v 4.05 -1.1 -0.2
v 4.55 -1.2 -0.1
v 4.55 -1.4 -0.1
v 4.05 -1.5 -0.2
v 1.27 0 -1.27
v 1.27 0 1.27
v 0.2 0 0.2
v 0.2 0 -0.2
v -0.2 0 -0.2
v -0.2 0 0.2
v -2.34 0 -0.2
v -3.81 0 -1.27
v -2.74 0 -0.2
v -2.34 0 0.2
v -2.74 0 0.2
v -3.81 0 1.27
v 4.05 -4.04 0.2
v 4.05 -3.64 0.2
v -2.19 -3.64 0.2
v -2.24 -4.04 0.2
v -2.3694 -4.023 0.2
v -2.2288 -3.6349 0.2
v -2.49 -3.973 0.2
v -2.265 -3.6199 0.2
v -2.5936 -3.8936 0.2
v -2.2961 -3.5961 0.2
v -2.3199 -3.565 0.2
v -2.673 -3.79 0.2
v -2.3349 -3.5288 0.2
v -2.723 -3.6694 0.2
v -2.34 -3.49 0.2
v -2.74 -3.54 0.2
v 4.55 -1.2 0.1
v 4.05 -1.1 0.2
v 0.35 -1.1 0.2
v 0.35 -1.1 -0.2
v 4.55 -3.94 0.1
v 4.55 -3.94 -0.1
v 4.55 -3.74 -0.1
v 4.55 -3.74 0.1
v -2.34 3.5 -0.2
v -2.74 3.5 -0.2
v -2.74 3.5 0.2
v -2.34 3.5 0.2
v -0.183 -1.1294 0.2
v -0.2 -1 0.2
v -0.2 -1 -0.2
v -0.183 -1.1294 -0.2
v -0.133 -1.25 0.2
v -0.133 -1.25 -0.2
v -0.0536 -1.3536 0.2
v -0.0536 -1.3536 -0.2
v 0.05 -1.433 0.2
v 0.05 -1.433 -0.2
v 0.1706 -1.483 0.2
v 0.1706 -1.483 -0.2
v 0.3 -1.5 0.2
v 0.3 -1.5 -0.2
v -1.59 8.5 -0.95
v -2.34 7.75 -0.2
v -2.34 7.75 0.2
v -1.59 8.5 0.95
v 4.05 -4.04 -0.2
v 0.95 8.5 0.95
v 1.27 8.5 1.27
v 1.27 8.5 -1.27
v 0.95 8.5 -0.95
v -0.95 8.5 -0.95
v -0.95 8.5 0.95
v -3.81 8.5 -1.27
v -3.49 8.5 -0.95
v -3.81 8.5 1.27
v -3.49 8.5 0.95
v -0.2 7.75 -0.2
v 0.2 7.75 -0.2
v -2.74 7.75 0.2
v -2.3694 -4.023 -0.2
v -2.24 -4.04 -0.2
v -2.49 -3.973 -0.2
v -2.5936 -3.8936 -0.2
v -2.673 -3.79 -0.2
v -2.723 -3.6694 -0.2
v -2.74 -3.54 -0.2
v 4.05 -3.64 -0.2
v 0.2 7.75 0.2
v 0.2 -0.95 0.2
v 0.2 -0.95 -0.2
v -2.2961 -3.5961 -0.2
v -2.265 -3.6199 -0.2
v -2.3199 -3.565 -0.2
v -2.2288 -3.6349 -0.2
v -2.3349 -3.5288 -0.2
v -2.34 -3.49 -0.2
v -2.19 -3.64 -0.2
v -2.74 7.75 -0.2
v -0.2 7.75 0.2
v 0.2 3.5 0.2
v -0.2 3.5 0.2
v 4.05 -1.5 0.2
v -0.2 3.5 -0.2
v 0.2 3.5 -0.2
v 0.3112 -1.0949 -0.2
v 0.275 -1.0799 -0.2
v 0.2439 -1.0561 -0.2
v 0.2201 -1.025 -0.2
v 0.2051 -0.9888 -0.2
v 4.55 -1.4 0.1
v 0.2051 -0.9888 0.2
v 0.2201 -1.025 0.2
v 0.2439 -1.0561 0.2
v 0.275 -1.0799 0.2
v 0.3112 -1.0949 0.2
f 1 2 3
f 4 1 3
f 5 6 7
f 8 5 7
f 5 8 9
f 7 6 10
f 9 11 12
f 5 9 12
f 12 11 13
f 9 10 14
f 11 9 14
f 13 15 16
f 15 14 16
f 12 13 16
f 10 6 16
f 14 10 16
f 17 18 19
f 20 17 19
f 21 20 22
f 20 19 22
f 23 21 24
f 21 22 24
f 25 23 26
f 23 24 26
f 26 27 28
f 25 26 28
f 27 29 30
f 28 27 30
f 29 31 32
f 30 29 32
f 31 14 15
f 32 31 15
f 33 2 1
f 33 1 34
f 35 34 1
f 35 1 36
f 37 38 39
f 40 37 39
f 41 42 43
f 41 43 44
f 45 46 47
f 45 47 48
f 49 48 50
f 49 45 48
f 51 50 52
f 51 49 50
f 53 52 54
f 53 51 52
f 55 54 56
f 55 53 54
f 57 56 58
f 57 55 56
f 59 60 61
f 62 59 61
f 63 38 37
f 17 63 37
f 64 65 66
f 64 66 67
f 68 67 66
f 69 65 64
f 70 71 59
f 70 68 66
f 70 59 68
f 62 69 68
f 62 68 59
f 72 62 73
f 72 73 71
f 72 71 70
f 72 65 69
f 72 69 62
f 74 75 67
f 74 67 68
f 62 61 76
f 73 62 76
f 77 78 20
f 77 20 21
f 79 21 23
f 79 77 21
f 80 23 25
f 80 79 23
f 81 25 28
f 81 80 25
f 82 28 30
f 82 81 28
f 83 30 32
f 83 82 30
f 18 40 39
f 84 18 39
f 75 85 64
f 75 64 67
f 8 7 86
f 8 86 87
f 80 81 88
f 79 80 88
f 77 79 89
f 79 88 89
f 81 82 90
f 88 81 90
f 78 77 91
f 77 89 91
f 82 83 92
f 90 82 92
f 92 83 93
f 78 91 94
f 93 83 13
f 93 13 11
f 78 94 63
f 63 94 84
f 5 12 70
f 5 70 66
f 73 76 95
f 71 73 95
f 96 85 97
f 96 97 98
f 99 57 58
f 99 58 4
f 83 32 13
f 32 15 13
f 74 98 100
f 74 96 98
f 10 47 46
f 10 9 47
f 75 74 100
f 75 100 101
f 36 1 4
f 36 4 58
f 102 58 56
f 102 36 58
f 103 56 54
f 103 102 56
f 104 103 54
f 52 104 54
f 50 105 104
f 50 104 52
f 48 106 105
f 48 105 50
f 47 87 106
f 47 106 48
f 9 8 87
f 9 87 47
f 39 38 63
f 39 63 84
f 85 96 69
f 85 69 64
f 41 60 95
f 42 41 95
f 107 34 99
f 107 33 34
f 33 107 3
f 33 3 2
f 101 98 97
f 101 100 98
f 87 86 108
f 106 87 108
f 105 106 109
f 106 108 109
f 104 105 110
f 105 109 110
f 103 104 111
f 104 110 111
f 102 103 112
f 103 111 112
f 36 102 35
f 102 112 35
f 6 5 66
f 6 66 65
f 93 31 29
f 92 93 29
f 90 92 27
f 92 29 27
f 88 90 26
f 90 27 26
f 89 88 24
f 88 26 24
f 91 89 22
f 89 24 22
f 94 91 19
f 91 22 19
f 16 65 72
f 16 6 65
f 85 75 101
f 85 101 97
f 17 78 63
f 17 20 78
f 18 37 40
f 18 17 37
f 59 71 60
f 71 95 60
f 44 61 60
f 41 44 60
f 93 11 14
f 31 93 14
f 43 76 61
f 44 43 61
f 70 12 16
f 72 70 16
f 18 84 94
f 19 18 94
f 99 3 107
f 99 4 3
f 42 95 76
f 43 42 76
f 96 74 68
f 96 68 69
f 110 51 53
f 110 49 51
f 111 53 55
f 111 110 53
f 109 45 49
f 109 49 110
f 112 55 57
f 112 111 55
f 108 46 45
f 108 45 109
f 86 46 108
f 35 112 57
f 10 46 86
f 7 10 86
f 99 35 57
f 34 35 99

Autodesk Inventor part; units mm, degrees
ref_plane "YZ Plane" through (0, 0, 0) normal (1, 0, 0) x (0, 1, 0)
ref_plane "XZ Plane" through (0, 0, 0) normal (0, 1, 0) x (-1, 0, 0)
ref_plane "XY Plane" through (0, 0, 0) normal (0, 0, 1) x (1, 0, 0)
sketch "Sketch1" plane through (0, 0, 0) normal (0, 1, 0) x (-1, 0, 0)
  line L0 (-1.27, 1.27) -> (1.27, 1.27)
  line L1 (1.27, 1.27) -> (1.27, -1.27)
  line L2 (1.27, -1.27) -> (-1.27, -1.27)
  line L3 (-1.27, -1.27) -> (-1.27, 1.27)
  line L4 (-1.27, 1.27) -> (1.27, -1.27) construction
  line L5 (1.27, 1.27) -> (-1.27, -1.27) construction
  line L6 (1.27, -1.27) -> (3.81, -1.27)
  line L7 (3.81, -1.27) -> (3.81, 1.27)
  line L8 (3.81, 1.27) -> (1.27, 1.27)
  line L9 (1.27, 1.27) -> (1.27, -1.27)
  point P0 (0, 0)
  dimension "d0" = 2.54
  dimension "d1" = 2.54
extrude "Extrusion1" add sketch "Sketch1" along normal blind 8.5
sketch "Sketch2" plane through (0, 8.5, 0) normal (0, 1, 0) x (1, 0, 0)
  line L0 (0.2, -0.2) -> (-0.2, -0.2)
  line L1 (-0.2, -0.2) -> (-0.2, 0.2)
  line L2 (-0.2, 0.2) -> (0.2, 0.2)
  line L3 (0.2, 0.2) -> (0.2, -0.2)
  line L4 (0.2, -0.2) -> (-0.2, 0.2) construction
  line L5 (-0.2, -0.2) -> (0.2, 0.2) construction
  line L6 (-2.34, 0.2) -> (-2.74, 0.2)
  line L7 (-2.74, 0.2) -> (-2.74, -0.2)
  line L8 (-2.74, -0.2) -> (-2.34, -0.2)
  line L9 (-2.34, -0.2) -> (-2.34, 0.2)
  line L10 (-2.34, 0.2) -> (-2.74, -0.2) construction
  line L11 (-2.74, 0.2) -> (-2.34, -0.2) construction
  point P0 (0, 0)
  point P1 (-2.54, 0)
  dimension "d4" = 0.4
  dimension "d5" = 0.4
  dimension "d45" = 0.4
  dimension "d46" = 2.54
extrude "Extrusion2" cut sketch "Sketch2" against normal blind 5
chamfer "Chamfer1" distance 0.75 angle 45 8 edges at (0, 8.5, 0.2) (-0.2, 8.5, 0) (0, 8.5, -0.2) (0.2, 8.5, 0) (-2.54, 8.5, -0.2) (-2.74, 8.5, 0) (-2.54, 8.5, 0.2) (-2.34, 8.5, 0)
sketch "Sketch3" plane through (0, 0, 0) normal (0, -1, 0) x (1, 0, 0)
  line L0 (-0.2, 0.2) -> (0.2, 0.2)
  line L1 (0.2, 0.2) -> (0.2, -0.2)
  line L2 (0.2, -0.2) -> (-0.2, -0.2)
  line L3 (-0.2, -0.2) -> (-0.2, 0.2)
  line L4 (-0.2, 0.2) -> (0.2, -0.2) construction
  line L5 (0.2, 0.2) -> (-0.2, -0.2) construction
  point P0 (0, 0)
  dimension "d11" = 0.4
  dimension "d12" = 0.4
extrude "Extrusion3" add sketch "Sketch3" along normal blind 1.5
sketch "Sketch4" plane through (-0.2, 0, 0.2) normal (0, 0, 1) x (1, 0, 0)
  line L0 (0, -1.5) -> (4.75, -1.5)
  line L1 (4.75, -1.5) -> (4.75, -1.1)
  line L2 (4.75, -1.1) -> (0, -1.1)
  line L3 (0, -1.1) -> (0, -1.5)
  point P0 (0.2, 0)
  dimension "d27" = 0.4
  dimension "d28" = 4.75
extrude "Extrusion4" add sketch "Sketch4" against normal up to surface (0.4 mm away)
fillet "Fillet1" radius 0.5 1 edges at (-0.2, -1.5, 0)
fillet "Fillet2" radius 0.15 1 edges at (0.2, -1.1, 0)
chamfer "Chamfer6" distance 0.5 distance2 0.1 1 edges at (4.55, -1.3, 0.2) measured on face at (1.7333, -1.3667, 0.2)
chamfer "Chamfer7" distance 0.5 distance2 0.1 1 edges at (4.55, -1.1, -0.05) measured on face at (2.9833, -1.1, -0.0667)
chamfer "Chamfer8" distance 0.1 distance2 0.5 1 edges at (4.55, -1.35, -0.2) measured on face at (4.55, -1.4, 0)
chamfer "Chamfer9" distance 0.1 distance2 0.5 1 edges at (4.55, -1.5, 0) measured on face at (4.55, -1.4, 0.0333)
sketch "Sketch5" plane through (0, 0, 0) normal (0, -1, 0) x (1, 0, 0)
  line L0 (-2.74, -0.2) -> (-2.34, -0.2) projected
  line L1 (-1.59, 0.95) -> (-2.34, 0.2) projected
  line L2 (-2.74, -0.2) -> (-2.34, -0.2)
  line L3 (-2.34, -0.2) -> (-2.34, 0.2)
  line L4 (-2.34, 0.2) -> (-2.74, 0.2)
  line L5 (-2.74, 0.2) -> (-2.74, -0.2)
  point P0 (0, 0)
extrude "Extrusion5" add sketch "Sketch5" along normal blind 4.04
sketch "Sketch6" plane through (-2.34, 0, -0.2) normal (0, 0, -1) x (-1, 0, 0)
  line L0 (0.4, 0) -> (0.4, -4.04) projected
  line L1 (0.4, -4.04) -> (-6.89, -4.04)
  line L2 (-6.89, -4.04) -> (-6.89, -3.64)
  line L3 (-6.89, -3.64) -> (0.4, -3.64)
  line L4 (0.4, -3.64) -> (0.4, -4.04)
  point P0 (-2.34, 0)
  dimension "d49" = 0.4
extrude "Extrusion6" add sketch "Sketch6" against normal up to surface (0.4 mm away)
fillet "Fillet3" radius 0.5 1 edges at (-2.74, -4.04, 0)
fillet "Fillet4" radius 0.15 1 edges at (-2.34, -3.64, 0)
chamfer "Chamfer10" distance 0.1 distance2 0.5 1 edges at (4.55, -3.84, 0.2) measured on face at (4.55, -3.7733, -0.0667)
chamfer "Chamfer11" distance 0.1 distance2 0.5 1 edges at (4.55, -3.64, -0.05) measured on face at (4.55, -3.7733, -0.1)
chamfer "Chamfer12" distance 0.5 distance2 0.1 1 edges at (4.55, -4.04, -0.05) measured on face at (2.12, -4.04, -0.0667)
chamfer "Chamfer13" distance 0.5 distance2 0.1 1 edges at (4.55, -3.84, -0.2) measured on face at (-0.1267, -3.9067, -0.2)
properties part number "FemaleHederPin_2_90"
